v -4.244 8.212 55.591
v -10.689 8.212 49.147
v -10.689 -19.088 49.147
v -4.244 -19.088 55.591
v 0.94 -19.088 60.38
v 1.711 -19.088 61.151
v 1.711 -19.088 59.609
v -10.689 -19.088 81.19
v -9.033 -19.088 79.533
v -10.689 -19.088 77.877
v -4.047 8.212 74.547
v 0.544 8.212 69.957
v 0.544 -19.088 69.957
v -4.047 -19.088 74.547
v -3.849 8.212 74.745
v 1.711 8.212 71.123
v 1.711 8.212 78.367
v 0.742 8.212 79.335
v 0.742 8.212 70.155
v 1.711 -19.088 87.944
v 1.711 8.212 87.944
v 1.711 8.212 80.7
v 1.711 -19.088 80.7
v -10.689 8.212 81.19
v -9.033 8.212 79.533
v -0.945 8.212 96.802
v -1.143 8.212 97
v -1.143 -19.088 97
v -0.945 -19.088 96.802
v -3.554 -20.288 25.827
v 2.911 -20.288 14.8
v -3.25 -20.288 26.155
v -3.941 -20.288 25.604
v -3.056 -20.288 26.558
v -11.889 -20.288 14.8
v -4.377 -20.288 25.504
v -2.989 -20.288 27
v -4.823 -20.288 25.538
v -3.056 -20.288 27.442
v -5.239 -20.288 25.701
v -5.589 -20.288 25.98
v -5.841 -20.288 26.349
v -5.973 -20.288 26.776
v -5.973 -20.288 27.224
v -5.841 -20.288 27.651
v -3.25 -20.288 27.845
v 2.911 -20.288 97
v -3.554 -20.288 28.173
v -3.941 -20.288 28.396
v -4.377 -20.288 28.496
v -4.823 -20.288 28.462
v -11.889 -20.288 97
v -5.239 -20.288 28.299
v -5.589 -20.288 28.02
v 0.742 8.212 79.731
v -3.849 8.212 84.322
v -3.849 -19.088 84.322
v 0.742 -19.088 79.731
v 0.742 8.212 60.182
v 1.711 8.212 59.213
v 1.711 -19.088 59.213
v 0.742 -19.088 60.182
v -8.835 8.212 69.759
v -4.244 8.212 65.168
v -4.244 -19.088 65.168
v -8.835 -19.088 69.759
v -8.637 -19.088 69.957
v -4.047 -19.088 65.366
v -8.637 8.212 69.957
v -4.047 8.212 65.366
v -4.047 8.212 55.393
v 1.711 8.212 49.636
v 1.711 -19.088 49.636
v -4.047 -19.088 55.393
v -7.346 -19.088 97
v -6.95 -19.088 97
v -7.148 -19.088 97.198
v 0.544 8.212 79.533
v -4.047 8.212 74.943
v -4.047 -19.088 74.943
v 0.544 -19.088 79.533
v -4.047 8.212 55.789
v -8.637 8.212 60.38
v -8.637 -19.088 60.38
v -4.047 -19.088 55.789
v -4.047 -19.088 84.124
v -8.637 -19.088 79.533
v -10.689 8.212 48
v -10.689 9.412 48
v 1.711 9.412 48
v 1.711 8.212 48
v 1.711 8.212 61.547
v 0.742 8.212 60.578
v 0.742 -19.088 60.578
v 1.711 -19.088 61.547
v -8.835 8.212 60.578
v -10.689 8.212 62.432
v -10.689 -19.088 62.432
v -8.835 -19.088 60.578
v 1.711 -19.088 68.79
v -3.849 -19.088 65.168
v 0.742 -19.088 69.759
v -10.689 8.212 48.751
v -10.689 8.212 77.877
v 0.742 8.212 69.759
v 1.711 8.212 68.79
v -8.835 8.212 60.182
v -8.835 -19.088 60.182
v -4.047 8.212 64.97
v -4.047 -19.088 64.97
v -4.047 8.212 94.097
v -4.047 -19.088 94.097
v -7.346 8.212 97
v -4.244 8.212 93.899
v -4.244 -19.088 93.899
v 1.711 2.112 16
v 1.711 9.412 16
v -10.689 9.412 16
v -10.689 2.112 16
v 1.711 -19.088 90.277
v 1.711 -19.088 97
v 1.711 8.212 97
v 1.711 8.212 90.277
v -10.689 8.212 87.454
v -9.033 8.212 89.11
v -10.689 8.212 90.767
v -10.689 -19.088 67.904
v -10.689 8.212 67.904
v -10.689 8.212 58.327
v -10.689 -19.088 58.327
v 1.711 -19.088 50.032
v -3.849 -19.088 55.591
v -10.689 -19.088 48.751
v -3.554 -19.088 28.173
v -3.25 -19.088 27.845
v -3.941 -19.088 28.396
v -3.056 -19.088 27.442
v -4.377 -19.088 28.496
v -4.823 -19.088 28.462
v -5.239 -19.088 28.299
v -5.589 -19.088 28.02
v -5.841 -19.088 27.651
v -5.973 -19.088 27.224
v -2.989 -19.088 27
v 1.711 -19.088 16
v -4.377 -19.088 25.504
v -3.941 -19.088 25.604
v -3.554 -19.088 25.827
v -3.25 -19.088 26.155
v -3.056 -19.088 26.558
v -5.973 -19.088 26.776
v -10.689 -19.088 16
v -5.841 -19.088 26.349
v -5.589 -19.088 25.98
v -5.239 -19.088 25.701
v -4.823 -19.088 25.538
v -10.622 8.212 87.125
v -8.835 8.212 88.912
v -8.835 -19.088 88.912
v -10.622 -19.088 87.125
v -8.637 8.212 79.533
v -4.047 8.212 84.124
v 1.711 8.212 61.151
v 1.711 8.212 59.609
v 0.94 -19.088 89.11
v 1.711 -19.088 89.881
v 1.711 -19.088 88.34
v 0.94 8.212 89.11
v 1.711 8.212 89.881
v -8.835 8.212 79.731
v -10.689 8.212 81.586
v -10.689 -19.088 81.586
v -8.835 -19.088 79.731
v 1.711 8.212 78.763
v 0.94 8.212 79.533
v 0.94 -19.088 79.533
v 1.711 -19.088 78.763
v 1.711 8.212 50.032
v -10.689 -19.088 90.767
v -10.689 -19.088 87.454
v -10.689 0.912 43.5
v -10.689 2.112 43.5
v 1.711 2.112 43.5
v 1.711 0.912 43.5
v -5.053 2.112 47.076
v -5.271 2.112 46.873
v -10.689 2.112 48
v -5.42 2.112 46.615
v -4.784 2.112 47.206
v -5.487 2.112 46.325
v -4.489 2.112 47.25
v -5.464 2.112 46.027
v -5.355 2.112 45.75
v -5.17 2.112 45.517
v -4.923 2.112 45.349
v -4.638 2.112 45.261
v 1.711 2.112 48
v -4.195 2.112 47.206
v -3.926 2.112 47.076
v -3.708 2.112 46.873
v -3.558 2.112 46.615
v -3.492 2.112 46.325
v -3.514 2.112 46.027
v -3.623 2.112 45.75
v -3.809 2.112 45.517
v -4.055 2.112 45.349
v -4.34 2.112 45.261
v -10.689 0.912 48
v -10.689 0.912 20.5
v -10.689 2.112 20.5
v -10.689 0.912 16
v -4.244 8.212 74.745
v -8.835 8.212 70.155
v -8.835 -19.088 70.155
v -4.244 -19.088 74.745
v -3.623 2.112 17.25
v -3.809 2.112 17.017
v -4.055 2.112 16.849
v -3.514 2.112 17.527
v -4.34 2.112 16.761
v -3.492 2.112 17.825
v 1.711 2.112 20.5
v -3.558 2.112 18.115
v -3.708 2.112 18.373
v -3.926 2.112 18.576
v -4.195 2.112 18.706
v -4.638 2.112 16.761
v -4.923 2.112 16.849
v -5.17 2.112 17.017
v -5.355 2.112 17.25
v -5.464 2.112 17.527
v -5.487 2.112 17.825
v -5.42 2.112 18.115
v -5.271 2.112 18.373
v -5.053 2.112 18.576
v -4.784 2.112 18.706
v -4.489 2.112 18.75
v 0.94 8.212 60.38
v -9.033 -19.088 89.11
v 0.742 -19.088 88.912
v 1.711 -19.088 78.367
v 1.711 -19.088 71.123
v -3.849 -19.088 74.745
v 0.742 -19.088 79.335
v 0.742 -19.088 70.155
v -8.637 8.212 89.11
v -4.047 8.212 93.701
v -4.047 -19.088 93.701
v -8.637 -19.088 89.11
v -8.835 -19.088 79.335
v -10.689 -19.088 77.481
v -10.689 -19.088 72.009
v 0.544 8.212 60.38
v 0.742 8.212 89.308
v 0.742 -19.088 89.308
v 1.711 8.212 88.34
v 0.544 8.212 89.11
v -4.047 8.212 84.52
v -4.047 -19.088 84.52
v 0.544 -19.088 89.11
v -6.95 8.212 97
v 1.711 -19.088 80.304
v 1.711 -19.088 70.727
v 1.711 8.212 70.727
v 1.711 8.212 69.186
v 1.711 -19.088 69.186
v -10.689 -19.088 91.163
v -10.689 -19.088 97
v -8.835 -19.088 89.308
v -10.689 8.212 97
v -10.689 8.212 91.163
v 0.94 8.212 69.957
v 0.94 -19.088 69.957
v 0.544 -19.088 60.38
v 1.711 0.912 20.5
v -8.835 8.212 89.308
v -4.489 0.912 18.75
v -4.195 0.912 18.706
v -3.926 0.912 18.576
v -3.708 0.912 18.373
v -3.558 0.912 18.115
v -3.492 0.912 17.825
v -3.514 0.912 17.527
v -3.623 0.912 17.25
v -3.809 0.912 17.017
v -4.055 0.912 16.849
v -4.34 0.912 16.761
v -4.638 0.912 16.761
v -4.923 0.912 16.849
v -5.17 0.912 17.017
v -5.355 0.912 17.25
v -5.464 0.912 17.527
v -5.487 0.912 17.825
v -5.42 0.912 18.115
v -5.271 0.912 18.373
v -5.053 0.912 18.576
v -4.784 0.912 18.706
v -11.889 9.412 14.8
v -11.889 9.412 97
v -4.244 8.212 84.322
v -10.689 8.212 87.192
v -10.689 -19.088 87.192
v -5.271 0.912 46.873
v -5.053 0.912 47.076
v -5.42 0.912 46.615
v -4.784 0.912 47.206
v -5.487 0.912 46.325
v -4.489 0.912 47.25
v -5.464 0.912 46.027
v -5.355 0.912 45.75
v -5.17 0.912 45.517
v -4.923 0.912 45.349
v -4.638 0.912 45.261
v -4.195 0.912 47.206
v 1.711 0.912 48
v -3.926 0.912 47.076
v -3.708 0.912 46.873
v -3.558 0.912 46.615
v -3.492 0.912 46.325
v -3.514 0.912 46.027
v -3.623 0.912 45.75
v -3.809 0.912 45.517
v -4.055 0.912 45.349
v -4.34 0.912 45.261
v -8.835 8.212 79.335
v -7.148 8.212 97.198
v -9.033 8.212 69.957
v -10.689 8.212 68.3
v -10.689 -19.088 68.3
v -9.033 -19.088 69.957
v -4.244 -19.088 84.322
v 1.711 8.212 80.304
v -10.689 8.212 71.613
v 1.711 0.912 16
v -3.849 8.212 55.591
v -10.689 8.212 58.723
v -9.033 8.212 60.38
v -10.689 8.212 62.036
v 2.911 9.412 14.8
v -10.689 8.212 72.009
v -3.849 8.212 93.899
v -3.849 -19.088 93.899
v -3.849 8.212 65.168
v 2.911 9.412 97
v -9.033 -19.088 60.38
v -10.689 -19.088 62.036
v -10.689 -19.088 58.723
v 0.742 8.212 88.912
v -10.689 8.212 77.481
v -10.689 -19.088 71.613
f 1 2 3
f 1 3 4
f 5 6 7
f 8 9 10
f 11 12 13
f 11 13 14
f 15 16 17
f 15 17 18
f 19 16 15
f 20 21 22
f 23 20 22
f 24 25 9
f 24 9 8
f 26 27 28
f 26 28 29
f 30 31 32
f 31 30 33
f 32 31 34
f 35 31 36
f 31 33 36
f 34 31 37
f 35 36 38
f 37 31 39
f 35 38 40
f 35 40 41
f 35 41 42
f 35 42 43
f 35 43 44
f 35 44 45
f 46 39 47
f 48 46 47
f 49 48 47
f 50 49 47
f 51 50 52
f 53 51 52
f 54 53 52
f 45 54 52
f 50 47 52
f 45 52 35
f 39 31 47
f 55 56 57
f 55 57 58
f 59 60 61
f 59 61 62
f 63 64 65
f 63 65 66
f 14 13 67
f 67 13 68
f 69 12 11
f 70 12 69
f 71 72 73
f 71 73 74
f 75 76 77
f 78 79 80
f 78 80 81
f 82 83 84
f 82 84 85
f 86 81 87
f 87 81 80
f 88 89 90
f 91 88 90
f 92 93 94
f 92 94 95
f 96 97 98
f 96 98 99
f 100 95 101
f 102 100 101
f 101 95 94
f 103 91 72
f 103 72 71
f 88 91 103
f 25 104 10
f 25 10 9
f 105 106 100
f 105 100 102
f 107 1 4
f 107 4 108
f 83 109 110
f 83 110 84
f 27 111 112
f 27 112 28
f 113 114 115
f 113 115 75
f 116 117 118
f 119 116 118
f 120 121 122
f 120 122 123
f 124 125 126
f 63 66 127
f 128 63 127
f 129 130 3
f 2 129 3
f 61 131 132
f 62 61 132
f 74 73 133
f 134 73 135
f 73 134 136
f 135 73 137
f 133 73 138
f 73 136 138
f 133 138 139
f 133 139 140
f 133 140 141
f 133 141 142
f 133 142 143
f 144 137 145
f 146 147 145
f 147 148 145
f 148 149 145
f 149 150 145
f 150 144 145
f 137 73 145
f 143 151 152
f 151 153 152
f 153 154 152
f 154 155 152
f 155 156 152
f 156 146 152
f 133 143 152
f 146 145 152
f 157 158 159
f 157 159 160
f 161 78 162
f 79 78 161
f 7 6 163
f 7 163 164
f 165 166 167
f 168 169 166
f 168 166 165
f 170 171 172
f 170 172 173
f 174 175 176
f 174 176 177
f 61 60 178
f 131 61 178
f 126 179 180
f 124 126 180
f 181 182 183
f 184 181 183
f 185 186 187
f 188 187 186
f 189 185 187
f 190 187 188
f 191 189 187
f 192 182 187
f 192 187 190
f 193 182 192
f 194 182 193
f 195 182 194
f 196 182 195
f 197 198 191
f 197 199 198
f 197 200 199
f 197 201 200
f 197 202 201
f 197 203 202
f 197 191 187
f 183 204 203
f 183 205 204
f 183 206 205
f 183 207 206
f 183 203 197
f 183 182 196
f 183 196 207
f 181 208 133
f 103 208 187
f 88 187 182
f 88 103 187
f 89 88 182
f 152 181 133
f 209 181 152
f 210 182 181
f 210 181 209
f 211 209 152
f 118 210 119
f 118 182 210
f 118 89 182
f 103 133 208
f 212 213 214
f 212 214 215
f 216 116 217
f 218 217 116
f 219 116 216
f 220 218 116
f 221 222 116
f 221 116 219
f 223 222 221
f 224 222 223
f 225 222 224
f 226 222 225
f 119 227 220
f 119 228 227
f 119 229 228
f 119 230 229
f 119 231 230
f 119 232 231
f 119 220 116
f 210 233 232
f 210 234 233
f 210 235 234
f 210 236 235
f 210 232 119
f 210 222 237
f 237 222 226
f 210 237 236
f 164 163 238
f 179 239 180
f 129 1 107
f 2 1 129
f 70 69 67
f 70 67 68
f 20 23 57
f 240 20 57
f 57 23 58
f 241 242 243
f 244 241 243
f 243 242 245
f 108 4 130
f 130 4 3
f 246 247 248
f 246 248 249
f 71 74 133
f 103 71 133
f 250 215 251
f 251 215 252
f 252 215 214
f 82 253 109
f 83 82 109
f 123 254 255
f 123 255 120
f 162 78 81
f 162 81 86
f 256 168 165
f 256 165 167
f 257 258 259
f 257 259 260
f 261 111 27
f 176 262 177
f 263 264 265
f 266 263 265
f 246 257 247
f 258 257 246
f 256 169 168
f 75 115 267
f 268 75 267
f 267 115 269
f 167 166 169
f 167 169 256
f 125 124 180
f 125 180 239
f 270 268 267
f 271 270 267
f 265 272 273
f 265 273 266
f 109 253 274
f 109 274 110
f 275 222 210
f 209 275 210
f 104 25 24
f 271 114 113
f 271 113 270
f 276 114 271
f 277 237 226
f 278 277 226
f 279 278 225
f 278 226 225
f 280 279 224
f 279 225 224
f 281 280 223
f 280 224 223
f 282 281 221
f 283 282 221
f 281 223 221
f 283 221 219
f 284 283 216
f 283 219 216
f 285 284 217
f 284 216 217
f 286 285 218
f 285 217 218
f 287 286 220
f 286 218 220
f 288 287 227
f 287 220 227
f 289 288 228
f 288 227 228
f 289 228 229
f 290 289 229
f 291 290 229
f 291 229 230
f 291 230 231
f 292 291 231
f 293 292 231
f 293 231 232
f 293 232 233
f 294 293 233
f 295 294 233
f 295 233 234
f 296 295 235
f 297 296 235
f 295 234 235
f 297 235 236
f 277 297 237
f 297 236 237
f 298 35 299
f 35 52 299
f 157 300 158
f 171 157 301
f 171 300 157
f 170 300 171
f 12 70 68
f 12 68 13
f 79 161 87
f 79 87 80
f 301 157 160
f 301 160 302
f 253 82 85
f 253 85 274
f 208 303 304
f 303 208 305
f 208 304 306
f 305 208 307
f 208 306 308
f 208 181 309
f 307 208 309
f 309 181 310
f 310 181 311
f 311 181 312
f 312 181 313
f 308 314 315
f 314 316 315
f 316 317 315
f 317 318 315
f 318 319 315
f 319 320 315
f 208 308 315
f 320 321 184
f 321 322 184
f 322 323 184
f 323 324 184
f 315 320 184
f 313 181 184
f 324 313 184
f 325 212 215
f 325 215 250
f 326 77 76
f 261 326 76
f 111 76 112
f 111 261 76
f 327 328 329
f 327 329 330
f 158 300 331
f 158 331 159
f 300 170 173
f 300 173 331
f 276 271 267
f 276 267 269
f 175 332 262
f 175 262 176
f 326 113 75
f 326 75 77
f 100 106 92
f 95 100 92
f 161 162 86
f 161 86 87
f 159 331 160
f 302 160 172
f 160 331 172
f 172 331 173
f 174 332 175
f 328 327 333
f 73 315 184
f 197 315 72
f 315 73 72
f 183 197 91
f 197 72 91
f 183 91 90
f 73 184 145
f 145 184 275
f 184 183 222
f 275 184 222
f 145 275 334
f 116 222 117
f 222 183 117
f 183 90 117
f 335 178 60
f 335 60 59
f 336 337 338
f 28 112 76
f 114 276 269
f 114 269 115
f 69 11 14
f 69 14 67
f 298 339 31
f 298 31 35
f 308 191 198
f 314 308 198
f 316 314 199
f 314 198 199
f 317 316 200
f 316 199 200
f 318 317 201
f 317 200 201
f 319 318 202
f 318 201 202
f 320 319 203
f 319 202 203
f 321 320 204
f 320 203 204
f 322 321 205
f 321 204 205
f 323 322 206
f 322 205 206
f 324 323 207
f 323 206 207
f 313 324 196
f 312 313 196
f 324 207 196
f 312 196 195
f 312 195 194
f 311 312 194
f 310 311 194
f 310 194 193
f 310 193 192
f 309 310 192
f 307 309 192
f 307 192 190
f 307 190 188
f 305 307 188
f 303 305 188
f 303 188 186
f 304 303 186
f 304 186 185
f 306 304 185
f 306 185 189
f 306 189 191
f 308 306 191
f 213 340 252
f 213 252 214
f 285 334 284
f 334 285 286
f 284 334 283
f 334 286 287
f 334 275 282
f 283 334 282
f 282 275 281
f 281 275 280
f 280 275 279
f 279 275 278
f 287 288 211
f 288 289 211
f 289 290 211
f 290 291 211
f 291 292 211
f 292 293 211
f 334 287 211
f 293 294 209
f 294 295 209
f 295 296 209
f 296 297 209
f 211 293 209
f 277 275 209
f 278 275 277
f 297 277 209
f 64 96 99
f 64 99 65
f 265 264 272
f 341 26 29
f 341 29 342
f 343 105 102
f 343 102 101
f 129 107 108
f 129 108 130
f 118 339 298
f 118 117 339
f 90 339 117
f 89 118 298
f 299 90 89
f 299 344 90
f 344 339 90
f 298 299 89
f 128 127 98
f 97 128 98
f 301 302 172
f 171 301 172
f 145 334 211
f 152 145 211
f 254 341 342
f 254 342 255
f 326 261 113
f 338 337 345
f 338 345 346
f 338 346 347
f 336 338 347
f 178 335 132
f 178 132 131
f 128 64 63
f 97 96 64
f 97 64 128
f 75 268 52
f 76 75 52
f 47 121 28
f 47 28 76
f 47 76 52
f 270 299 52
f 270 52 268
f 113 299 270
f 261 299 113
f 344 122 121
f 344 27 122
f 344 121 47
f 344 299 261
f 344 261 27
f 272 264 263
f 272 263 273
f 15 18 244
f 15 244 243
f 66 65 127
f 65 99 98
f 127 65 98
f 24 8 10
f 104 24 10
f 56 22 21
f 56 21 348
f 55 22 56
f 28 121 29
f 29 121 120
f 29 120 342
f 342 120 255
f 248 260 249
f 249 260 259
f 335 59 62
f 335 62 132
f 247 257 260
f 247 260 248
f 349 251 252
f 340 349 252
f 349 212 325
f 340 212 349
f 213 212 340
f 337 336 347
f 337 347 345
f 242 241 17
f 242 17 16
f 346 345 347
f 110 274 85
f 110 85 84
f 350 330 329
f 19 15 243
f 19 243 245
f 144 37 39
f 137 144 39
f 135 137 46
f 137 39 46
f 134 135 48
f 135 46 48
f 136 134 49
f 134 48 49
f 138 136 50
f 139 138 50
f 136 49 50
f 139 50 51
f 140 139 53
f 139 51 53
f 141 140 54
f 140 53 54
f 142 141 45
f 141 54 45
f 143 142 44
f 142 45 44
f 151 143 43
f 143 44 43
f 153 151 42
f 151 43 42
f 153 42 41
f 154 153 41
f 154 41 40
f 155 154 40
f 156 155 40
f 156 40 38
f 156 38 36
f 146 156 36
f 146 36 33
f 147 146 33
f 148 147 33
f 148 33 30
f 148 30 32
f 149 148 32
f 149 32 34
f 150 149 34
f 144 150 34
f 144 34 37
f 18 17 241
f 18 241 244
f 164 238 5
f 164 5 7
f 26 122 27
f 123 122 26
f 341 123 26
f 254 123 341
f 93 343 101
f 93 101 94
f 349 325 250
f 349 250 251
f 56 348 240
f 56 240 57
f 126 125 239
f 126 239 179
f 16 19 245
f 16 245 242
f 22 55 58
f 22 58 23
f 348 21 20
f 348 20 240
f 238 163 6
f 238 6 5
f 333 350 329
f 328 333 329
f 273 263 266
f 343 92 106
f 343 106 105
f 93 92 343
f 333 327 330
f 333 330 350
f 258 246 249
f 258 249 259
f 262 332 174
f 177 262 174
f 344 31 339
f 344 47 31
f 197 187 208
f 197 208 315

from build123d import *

# Parameters (mm, degrees)
SKETCH2_W           = 12.4
SKETCH2_H           = 27.3
BOSS_EXTRUDE1_DEPTH = 81
SKETCH3_W           = 12.4
SKETCH3_H           = 1.2
BOSS_EXTRUDE2_DEPTH = 4.5
SKETCH6_W           = 12.4
SKETCH6_H           = 1.2
BOSS_EXTRUDE3_DEPTH = 4.5
SKETCH7_R           = 1
CUT_EXTRUDE2_DEPTH  = 4.5
SKETCH9_R           = 1
CUT_EXTRUDE3_DEPTH  = 1.2
SKETCH11_W          = 12.4
SKETCH11_H          = 32
CUT_EXTRUDE4_DEPTH  = 2
SKETCH12_R          = 1.5
CUT_EXTRUDE5_DEPTH  = 3
SKETCH13_W          = 14.8
SKETCH13_H          = 29.7
BOSS_EXTRUDE4_DEPTH = 1.2
EXTRUDE_THIN4_DEPTH = 27.3


with BuildPart() as part:
    # Sketch2 → Boss-Extrude1 (new body)
    with BuildSketch(Plane(origin=(0, 0, 16), x_dir=(-1, 0, 0), z_dir=(0, 0, -1))):
        Polygon((-1.710644683, 9.412349839), (10.689355317, 9.412349839), (11.889355317, 9.412349839), (11.889355317, -20.287650161), (-2.910644683, -20.287650161), (-2.910644683, 9.412349839), align=None)
        with Locations((4.489355317, -5.437650161)):
            Rectangle(SKETCH2_W, SKETCH2_H, mode=Mode.SUBTRACT)
    extrude(amount=-BOSS_EXTRUDE1_DEPTH)

    # Sketch3 → Boss-Extrude2 (add)
    with BuildSketch(Plane(origin=(0, 0, 20.5), x_dir=(-1, 0, 0), z_dir=(0, 0, -1))):
        with Locations((4.489355317, 1.512349839)):
            Rectangle(SKETCH3_W, SKETCH3_H)
    extrude(amount=BOSS_EXTRUDE2_DEPTH)

    # Sketch6 → Boss-Extrude3 (add)
    with BuildSketch(Plane.XY.offset(43.5)):
        with Locations((-4.489355317, 1.512349839)):
            Rectangle(SKETCH6_W, SKETCH6_H)
    extrude(amount=BOSS_EXTRUDE3_DEPTH)

    # Sketch7 → Cut-Extrude2 (cut)
    with BuildSketch(Plane(origin=(0, 2.112349839, 0), x_dir=(1, 0, 0), z_dir=(0, 1, 0))):
        with Locations(Location((-4.489355317, -46.25, 0), (0, 0, 270))):
            Circle(SKETCH7_R)
    extrude(amount=-CUT_EXTRUDE2_DEPTH, mode=Mode.SUBTRACT)

    # Sketch9 → Cut-Extrude3 (cut)
    with BuildSketch(Plane(origin=(0, 2.112349839, 0), x_dir=(1, 0, 0), z_dir=(0, 1, 0))):
        with Locations(Location((-4.489355317, -17.75, 0), (0, 0, 270))):
            Circle(SKETCH9_R)
    extrude(amount=-CUT_EXTRUDE3_DEPTH, mode=Mode.SUBTRACT)

    # Sketch11 → Cut-Extrude4 (cut)
    with BuildSketch(Plane(origin=(0, 9.412349839, 0), x_dir=(1, 0, 0), z_dir=(0, 1, 0))):
        with Locations((-4.489355317, -32)):
            Rectangle(SKETCH11_W, SKETCH11_H)
    extrude(amount=-CUT_EXTRUDE4_DEPTH, mode=Mode.SUBTRACT)

    # Sketch12 → Cut-Extrude5 (cut)
    with BuildSketch(Plane.XZ.offset(20.287650161)):
        with Locations((-4.489355317, 27)):
            Circle(SKETCH12_R)
    extrude(amount=-CUT_EXTRUDE5_DEPTH, mode=Mode.SUBTRACT)

    # Sketch13 → Boss-Extrude4 (add)
    with BuildSketch(Plane(origin=(0, 0, 16), x_dir=(-1, 0, 0), z_dir=(0, 0, -1))):
        with Locations((4.489355317, -5.437650161)):
            Rectangle(SKETCH13_W, SKETCH13_H)
    extrude(amount=BOSS_EXTRUDE4_DEPTH)

    # Sketch14 → Extrude-Thin4 (add)
    with BuildSketch(Plane.XZ.offset(-8.212349839)):
        Polygon((-11.186012312, 48.649869812), (2.450882677, 62.2867648), (2.648872575, 62.088774902), (-10.988022413, 48.451879913), align=None)
        Polygon((2.450882677, 48.896001763), (-11.245895089, 62.592779529), (-11.04790519, 62.790769427), (2.648872575, 49.093991662), align=None)
        Polygon((-11.186012312, 58.226694419), (2.450882677, 71.863589408), (2.648872575, 71.665599509), (-10.988022413, 58.02870452), align=None)
        Polygon((2.450882677, 58.47282637), (-11.245895089, 72.169604136), (-11.04790519, 72.367594035), (2.648872575, 58.670816269), align=None)
        Polygon((-11.186012312, 67.803519026), (2.450882677, 81.440414015), (2.648872575, 81.242424116), (-10.988022413, 67.605529127), align=None)
        Polygon((2.450882677, 68.049650977), (-11.245895089, 81.746428743), (-11.04790519, 81.944418642), (2.648872575, 68.247640876), align=None)
        Polygon((-11.186012312, 77.380343633), (2.450882677, 91.017238622), (2.648872575, 90.819248723), (-10.988022413, 77.182353735), align=None)
        Polygon((2.450882677, 77.626475585), (-11.245895089, 91.32325335), (-11.04790519, 91.521243249), (2.648872575, 77.824465483), align=None)
        Polygon((-10.82008194, 87.323098613), (-1.143180553, 97), (-0.945190654, 96.802010101), (-10.622092041, 87.125108714), align=None)
        Polygon((1.710644683, 87.943538186), (-7.345817131, 97), (-7.147827233, 97.197989899), (1.908634582, 88.141528084), align=None)
    extrude(amount=EXTRUDE_THIN4_DEPTH)


solid = part.part
